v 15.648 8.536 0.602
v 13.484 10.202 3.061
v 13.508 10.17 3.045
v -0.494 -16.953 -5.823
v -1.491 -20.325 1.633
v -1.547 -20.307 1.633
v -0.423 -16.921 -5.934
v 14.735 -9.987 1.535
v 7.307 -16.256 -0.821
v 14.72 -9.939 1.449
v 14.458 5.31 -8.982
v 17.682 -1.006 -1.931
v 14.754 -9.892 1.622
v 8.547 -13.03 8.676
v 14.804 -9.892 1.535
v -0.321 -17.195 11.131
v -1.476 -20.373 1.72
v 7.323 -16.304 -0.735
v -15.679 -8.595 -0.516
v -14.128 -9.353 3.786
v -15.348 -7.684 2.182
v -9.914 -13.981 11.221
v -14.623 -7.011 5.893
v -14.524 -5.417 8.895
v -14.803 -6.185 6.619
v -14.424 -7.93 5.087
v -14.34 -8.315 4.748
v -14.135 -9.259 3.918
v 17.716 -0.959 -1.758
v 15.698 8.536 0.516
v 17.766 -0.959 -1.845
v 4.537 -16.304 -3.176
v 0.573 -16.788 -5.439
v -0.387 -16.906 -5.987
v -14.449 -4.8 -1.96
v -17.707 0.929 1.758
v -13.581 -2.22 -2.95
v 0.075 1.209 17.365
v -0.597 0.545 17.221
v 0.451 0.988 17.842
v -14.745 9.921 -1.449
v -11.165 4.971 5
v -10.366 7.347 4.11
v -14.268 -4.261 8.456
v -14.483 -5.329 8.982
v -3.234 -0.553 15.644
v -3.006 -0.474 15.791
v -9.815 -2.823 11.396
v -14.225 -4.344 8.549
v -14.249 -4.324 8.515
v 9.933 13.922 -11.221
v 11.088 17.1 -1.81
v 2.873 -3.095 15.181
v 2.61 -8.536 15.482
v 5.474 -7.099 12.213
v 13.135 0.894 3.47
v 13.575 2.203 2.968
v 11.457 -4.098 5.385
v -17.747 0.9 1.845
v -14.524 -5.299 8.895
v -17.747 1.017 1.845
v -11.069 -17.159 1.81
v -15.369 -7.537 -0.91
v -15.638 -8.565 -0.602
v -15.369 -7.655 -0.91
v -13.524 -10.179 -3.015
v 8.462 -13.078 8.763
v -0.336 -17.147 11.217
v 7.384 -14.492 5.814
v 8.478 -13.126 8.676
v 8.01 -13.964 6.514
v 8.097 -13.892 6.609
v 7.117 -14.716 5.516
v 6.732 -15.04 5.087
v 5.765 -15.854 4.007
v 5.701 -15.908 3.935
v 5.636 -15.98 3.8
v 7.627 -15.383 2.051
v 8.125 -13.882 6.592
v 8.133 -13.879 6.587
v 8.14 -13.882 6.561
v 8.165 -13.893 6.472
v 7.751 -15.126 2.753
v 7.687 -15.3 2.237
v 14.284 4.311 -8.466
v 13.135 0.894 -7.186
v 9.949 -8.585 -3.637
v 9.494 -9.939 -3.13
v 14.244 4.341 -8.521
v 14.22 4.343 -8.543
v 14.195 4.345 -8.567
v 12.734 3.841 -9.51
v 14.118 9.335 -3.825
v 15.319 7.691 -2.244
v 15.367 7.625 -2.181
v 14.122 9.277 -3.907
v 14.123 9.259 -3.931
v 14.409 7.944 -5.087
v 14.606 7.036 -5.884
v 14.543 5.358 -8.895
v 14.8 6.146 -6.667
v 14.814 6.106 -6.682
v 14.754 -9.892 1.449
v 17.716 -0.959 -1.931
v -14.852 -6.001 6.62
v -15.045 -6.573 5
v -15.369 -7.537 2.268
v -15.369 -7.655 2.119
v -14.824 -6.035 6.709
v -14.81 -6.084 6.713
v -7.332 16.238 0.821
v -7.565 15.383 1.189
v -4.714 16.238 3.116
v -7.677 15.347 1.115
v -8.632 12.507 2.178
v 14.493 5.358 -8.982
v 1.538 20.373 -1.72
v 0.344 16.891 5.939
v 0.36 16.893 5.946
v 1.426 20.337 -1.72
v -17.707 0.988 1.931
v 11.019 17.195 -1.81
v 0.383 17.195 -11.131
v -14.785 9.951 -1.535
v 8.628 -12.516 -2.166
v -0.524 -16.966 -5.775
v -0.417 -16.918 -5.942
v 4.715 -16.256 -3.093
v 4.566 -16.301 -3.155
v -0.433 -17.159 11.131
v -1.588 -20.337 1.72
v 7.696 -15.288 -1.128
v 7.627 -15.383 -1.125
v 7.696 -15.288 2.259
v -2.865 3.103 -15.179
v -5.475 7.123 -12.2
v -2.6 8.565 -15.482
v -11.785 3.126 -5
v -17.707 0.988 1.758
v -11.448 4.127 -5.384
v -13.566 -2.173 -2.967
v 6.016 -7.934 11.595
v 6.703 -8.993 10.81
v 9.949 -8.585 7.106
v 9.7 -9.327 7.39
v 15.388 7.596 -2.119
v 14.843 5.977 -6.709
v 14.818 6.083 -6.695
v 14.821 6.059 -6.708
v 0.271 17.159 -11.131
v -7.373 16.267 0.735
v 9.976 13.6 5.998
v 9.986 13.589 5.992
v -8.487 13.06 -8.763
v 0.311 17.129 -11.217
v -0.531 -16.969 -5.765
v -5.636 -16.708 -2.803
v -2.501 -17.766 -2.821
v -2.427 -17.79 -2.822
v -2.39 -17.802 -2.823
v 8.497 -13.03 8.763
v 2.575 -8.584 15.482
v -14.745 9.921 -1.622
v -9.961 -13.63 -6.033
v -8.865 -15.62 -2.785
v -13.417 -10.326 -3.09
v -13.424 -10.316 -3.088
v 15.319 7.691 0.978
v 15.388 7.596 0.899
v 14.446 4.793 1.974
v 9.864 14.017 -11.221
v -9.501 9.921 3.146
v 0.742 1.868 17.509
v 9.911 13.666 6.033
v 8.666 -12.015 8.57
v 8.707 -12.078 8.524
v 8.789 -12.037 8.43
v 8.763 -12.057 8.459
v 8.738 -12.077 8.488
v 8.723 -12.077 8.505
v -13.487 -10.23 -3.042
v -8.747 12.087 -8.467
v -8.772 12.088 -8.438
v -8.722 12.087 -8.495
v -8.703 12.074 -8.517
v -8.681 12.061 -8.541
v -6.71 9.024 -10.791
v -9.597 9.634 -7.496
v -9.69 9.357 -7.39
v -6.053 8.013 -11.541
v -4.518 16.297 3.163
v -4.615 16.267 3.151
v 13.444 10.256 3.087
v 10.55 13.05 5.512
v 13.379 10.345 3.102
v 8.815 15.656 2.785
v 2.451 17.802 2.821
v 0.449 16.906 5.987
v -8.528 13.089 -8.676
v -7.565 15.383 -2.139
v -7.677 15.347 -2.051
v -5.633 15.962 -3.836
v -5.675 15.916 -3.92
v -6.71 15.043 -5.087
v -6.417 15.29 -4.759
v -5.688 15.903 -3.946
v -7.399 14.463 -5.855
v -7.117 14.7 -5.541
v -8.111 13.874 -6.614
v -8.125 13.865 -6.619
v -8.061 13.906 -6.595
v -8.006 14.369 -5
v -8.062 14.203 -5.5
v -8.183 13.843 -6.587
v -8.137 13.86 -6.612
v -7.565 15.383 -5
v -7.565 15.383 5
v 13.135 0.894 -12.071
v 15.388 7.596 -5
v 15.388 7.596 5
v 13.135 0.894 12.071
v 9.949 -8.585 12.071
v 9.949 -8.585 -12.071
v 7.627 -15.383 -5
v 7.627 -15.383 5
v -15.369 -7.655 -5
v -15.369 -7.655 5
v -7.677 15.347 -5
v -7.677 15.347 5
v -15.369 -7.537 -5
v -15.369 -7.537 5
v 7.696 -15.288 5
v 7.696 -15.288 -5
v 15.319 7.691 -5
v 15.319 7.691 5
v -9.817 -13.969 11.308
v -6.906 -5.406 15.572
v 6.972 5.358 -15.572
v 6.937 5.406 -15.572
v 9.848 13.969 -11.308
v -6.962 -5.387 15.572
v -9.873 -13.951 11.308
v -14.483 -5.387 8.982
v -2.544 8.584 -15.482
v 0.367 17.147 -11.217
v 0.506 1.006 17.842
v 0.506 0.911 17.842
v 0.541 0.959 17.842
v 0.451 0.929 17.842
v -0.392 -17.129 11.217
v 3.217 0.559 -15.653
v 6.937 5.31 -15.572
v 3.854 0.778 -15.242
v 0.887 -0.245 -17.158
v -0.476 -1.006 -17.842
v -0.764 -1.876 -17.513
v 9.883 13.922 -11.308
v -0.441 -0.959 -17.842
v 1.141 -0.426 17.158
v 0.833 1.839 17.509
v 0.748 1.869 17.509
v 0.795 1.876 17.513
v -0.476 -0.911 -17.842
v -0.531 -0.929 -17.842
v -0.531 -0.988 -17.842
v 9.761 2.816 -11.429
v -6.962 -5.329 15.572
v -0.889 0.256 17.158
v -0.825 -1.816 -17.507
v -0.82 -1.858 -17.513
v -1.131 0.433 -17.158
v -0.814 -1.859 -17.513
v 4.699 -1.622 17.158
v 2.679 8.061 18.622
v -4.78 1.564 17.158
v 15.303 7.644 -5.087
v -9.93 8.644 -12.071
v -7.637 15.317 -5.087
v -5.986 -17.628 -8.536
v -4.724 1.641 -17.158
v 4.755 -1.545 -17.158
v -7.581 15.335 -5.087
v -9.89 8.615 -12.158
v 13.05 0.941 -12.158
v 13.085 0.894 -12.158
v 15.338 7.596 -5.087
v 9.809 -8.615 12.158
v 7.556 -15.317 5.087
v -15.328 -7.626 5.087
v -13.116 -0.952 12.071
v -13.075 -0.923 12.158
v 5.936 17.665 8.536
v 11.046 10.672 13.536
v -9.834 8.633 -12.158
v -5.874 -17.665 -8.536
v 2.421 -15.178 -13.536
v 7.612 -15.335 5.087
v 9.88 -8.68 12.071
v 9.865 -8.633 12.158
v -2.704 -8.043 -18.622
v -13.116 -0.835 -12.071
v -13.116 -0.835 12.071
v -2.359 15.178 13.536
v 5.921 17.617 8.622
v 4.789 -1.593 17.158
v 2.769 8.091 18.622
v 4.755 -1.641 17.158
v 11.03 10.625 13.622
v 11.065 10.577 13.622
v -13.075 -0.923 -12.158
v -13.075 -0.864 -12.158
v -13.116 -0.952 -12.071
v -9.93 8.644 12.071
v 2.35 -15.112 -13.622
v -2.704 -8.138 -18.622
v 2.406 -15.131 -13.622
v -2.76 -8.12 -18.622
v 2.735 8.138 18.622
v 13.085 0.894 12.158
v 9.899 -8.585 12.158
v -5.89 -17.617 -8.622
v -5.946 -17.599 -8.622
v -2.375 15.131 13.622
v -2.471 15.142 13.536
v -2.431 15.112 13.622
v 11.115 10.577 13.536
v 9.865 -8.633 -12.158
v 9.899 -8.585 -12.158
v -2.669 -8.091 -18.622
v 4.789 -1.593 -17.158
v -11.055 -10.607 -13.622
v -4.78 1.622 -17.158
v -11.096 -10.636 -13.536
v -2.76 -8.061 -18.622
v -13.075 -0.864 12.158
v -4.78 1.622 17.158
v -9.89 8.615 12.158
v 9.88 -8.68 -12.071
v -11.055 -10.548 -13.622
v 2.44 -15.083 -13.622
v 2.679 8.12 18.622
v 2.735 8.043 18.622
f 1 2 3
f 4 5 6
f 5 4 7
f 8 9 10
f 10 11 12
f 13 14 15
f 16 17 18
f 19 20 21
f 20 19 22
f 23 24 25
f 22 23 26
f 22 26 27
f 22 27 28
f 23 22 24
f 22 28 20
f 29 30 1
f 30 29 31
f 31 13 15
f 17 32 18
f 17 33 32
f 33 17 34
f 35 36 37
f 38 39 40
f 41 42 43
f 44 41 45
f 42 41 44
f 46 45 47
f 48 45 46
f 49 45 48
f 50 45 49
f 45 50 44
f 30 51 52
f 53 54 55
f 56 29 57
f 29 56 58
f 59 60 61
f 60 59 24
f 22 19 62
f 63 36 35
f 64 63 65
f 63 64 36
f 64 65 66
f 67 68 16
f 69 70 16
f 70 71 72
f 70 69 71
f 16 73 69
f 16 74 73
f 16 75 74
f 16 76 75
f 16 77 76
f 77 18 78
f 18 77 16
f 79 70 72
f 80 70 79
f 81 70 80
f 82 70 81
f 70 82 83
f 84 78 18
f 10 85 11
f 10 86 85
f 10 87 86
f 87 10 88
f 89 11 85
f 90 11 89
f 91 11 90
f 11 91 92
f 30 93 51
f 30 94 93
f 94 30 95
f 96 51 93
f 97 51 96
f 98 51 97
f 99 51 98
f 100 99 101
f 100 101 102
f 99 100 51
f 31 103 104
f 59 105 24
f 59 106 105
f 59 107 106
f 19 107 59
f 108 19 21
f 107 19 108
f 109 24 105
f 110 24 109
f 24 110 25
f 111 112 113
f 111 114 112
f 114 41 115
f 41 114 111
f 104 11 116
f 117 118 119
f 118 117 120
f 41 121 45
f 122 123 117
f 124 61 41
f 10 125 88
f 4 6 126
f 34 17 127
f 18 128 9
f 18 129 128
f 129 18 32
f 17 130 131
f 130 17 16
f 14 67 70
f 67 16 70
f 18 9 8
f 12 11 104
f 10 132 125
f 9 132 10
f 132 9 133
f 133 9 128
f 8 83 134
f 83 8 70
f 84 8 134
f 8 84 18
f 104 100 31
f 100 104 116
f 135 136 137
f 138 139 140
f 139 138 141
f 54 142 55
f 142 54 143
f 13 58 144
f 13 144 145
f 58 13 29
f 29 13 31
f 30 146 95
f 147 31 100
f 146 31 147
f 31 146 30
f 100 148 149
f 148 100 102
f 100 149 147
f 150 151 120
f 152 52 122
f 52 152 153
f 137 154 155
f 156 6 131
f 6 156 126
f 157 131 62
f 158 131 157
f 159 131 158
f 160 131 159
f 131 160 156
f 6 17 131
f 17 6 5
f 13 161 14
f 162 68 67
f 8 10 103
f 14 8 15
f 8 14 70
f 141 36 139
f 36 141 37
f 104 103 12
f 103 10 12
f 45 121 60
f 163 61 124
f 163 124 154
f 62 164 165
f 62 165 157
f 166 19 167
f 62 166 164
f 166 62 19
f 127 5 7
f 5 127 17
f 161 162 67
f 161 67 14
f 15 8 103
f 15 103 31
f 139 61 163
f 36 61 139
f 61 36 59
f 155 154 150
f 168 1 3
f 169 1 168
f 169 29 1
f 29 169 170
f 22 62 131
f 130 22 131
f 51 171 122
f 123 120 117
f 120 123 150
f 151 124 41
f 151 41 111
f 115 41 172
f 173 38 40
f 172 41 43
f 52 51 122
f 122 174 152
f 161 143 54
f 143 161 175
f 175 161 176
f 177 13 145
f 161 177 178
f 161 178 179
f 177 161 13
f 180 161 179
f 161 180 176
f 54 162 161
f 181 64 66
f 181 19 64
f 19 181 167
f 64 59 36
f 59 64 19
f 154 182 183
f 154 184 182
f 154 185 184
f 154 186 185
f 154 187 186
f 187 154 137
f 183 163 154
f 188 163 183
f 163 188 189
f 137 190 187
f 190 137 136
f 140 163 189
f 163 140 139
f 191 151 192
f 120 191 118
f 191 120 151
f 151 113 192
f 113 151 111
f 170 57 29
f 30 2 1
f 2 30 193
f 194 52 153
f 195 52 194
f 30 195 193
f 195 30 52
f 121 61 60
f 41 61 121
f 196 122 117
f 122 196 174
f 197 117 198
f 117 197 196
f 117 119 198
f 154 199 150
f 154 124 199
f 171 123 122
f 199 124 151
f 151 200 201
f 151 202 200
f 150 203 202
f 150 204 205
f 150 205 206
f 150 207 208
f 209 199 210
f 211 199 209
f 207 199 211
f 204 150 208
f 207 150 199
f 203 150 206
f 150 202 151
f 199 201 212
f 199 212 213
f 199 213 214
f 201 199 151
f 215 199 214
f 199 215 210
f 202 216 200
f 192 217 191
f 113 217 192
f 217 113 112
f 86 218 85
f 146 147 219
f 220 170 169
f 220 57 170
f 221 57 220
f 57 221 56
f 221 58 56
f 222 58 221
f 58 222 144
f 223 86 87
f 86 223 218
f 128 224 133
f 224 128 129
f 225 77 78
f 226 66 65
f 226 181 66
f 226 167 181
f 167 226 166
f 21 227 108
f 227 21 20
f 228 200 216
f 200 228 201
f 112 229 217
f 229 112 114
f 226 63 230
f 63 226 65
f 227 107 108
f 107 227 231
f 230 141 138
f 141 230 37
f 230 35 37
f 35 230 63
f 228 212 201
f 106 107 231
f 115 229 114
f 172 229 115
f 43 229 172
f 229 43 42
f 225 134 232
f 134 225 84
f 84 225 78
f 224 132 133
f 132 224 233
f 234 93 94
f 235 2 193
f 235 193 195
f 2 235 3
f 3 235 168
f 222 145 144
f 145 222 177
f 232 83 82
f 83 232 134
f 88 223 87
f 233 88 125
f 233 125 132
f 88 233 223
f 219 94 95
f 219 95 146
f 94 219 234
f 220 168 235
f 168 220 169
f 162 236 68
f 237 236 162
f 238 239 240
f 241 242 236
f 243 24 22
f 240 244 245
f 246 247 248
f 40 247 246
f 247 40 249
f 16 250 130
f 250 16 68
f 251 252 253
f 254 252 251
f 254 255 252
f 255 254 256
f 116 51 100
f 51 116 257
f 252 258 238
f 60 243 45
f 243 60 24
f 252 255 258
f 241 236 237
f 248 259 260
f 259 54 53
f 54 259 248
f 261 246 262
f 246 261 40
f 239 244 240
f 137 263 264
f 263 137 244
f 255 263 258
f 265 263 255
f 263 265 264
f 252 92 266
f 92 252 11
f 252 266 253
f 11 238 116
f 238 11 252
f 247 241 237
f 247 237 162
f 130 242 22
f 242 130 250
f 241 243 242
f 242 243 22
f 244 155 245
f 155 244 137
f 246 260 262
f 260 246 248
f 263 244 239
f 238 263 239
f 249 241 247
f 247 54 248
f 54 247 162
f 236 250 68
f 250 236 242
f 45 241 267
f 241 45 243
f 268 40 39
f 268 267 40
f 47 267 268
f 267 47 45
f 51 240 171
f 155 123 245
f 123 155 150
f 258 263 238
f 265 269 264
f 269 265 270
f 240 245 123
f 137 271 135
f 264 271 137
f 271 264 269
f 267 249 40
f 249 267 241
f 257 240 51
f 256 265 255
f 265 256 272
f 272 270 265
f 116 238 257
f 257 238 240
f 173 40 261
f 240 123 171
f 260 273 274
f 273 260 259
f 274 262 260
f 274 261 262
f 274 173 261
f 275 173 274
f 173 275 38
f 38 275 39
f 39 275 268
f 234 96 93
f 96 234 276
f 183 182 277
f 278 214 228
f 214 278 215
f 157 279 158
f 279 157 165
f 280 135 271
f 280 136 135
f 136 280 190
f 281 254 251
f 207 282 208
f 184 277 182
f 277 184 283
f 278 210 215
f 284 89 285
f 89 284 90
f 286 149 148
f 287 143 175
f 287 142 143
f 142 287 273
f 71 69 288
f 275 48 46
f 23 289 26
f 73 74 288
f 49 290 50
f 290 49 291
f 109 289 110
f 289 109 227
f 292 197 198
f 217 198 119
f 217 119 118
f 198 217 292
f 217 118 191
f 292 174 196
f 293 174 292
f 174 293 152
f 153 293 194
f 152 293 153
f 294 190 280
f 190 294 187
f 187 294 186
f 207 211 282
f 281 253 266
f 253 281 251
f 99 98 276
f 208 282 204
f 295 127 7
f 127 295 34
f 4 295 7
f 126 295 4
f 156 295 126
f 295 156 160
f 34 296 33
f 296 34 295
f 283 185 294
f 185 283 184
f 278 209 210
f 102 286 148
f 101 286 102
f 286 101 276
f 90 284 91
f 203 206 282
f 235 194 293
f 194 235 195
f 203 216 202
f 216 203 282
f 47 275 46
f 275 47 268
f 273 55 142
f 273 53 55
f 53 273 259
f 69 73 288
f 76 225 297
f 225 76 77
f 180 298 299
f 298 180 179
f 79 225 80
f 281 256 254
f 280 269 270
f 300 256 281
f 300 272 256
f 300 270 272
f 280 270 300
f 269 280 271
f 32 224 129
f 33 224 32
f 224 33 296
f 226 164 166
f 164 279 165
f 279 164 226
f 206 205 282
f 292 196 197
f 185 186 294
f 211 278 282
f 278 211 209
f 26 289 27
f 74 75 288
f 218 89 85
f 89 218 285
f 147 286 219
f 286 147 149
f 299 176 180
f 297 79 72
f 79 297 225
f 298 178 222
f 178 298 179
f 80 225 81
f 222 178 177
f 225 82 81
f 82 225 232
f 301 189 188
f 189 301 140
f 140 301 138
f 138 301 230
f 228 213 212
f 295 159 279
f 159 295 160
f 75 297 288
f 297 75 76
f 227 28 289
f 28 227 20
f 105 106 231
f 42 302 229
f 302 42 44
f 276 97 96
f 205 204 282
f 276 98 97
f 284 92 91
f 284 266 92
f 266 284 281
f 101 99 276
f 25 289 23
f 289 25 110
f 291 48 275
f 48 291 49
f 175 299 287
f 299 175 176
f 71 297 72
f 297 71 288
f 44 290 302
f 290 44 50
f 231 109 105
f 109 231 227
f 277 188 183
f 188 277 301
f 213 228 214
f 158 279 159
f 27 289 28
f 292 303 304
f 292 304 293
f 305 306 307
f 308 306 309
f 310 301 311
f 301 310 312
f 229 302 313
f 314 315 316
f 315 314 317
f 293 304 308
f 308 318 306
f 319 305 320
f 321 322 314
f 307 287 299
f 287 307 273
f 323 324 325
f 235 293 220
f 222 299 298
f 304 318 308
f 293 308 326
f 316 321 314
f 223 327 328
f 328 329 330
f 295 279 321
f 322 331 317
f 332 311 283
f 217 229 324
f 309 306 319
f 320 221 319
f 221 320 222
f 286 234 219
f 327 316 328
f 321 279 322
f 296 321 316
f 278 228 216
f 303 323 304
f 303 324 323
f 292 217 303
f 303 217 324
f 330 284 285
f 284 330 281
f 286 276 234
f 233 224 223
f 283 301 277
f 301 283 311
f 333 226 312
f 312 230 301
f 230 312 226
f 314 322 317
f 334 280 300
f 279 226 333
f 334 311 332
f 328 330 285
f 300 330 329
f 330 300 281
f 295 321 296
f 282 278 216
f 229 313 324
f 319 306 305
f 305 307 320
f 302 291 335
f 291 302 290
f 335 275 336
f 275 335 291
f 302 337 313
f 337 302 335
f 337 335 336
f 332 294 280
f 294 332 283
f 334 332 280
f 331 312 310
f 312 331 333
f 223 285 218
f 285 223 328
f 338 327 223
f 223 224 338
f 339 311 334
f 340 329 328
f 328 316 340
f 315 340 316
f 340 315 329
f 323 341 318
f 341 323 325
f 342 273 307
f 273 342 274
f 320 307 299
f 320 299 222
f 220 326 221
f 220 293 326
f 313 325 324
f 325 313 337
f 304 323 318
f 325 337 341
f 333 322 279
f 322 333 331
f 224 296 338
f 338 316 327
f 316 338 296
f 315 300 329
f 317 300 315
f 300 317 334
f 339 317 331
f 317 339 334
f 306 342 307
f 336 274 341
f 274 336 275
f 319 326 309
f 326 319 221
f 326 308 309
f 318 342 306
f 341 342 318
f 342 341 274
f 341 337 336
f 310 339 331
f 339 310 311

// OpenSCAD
// Auto-generated OpenSCAD file

    inner_points = 10*[[-0.9849058201924669, 0.8585262410125142, 1.2071067811863656], [-1.528785757453395, -0.759623373893002, -0.49999999999996925], [-0.7596233738762859, 1.5287857574549684, 0.4999999999997299], [-1.3035033111372138, -0.08936385745054792, -1.207106781186605], [1.3035033111553536, 0.08936385743535108, 1.207106781186605], [0.7596233738944258, -1.528785757470165, -0.4999999999997299], [1.5287857574715347, 0.7596233738778053, 0.49999999999996925], [0.9849058202106068, -0.8585262410277109, -1.2071067811863656], [-1.3035033111373446, -0.08936385745018655, 1.2071067811864902], [-1.5287857574534491, -0.7596233738928524, 0.5000000000000306], [-0.7596233738762316, 1.5287857574548187, -0.50000000000027], [-0.9849058201923361, 0.8585262410121528, -1.2071067811867295], [0.984905820210476, -0.8585262410273495, 1.2071067811867295], [0.7596233738943715, -1.5287857574700154, 0.50000000000027], [1.5287857574715888, 0.7596233738776557, -0.5000000000000306], [1.3035033111554843, 0.0893638574349897, -1.2071067811864902], [-0.4739450492223731, 0.159298745465096, 1.707106781186498], [-1.0178249864833009, -1.4588508694404203, 1.6314155227994063e-13], [0.06993488803873991, 1.7774483603701012, -2.6229591075641936e-13], [-0.4739450492221878, 0.15929874546458486, -1.707106781186597], [0.4739450492403277, -0.1592987454797817, 1.707106781186597], [-0.06993488802060001, -1.777448360385298, 2.6229591075641936e-13], [1.0178249865014406, 1.4588508694252236, -1.6314155227994063e-13], [0.47394504924051306, -0.15929874548029285, -1.707106781186498], [-0.23902080233061446, 1.5083023029927278, 1.353553390593035], [-1.1014982305363656, -1.0577374103756392, -1.3535533905931754], [1.1014982305545054, 1.0577374103604424, 1.3535533905931754], [0.2390208023487544, -1.5083023030079246, -1.353553390593035], [0.27193996863947956, 0.8090748074453095, 1.8535533905931674], [-0.5905374595662716, -1.7569649059230572, -0.8535533905930429], [0.5905374595844115, 1.7569649059078605, 0.8535533905930429], [-0.2719399686213396, -0.8090748074605062, -1.8535533905931674]];

    outer_points = 10*[[-0.8446900511180744, 1.3030414766726957, -0.867637706641361], [-1.5597798480580507, -0.8536041736719377, -0.05157812186332089], [-0.25595636104042685, 0.8536041736719377, -1.5394998597940455], [-0.9710461579804031, -1.3030414766726957, -0.7234402750160054], [0.9710461579804031, 1.3030414766726957, 0.7234402750160054], [0.25595636104042685, -0.8536041736719377, 1.5394998597940455], [1.5597798480580507, 0.8536041736719377, 0.05157812186332089], [0.8446900511180744, -1.3030414766726957, 0.867637706641361], [-1.470432588051366, 0.9891747549732535, -0.15354110359529327], [-1.7666324802585267, 0.0958628773675625, 0.18448184412432744], [-0.04910372883995073, -0.0958628773675625, -1.7755598257816938], [-0.34530362104711143, -0.9891747549732535, -1.437536878062073], [0.34530362104711143, 0.9891747549732535, 1.437536878062073], [0.04910372883995073, 0.0958628773675625, 1.7755598257816938], [1.7666324802585267, -0.0958628773675625, -0.18448184412432744], [1.470432588051366, -0.9891747549732535, 0.15354110359529327], [-0.7291708128859692, 1.6208416413427247, 0.07345652930633434], [-1.4442606098259454, -0.5358040090019087, 0.8895161140843744], [0.692158046325446, 0.5358040090019087, -1.5485621928800661], [-0.022931750614530233, -1.6208416413427247, -0.732502608102026], [0.022931750614530233, 1.6208416413427247, 0.732502608102026], [-0.692158046325446, -0.5358040090019087, 1.5485621928800661], [1.4442606098259454, 0.5358040090019087, -0.8895161140843744], [0.7291708128859692, -1.6208416413427247, -0.07345652930633434], [0.03517302803740674, 1.7099897115417881, -1.113064062349067], [-1.098806673635385, -1.7099897115417881, 0.18103215948739226], [1.098806673635385, 1.7099897115417881, -0.18103215948739226], [-0.03517302803740674, -1.7099897115417881, 1.113064062349067], [0.15069226626951202, 2.027789876211817, -0.17196982640137165], [-0.9832874354032798, -1.392189546871759, 1.122126395435088], [0.9832874354032798, 1.392189546871759, -1.122126395435088], [-0.15069226626951202, -2.027789876211817, 0.17196982640137165]];

    // Convex hull for inner set (I)
    module inner_hull() {
        hull() {
            for (p = inner_points) {
                translate(p) sphere(r=0.1);
            }
        }
    }

    // Convex hull for outer set (O) minus inner hull (O \ I)
    module outer_minus_inner() {
        difference() {
            hull() {
                for (p = outer_points) {
                    translate(p) sphere(r=0.1);
                }
            }
            inner_hull(); // Subtract inner hull
        }
    }

    // Convex hull for outer set (O) minus all translated inner hulls
    module outer_minus_AllTranslationInner() {
        difference() {
            hull() {
                for (p = outer_points) {
                    translate(p) sphere(r=0.1);
                }
            }
            hull() {
                translate([0,0,50]) inner_hull();
                translate([0,0,-50]) inner_hull();
            }; // Subtract translated inner hulls
        }
    }

    // Difference between outer_minus_inner and outer_minus_AllTranslationInner
    module outer_minus_inner_diff() {
        difference() {
            // Outer minus inner
            difference() {
                hull() {
                    for (p = outer_points) {
                        translate(p) sphere(r=0.1);
                    }
                }
                inner_hull();
            }

            // Subtract Outer minus AllTranslationInner
            difference() {
                hull() {
                    for (p = outer_points) {
                        translate(p) sphere(r=0.1);
                    }
                }
                hull() {
                    translate([0,0,50]) inner_hull();
                    translate([0,0,-50]) inner_hull();
                };
            }
        }
    }

    // Rendering all with colors applied
    color([1, 0, 0, 0.5]) inner_hull(); // Transparent red
    color([0, 1, 0, 1]) outer_minus_AllTranslationInner(); // Opaque green
    color([1, 1, 0, 1]) outer_minus_inner_diff(); // Opaque yellow
    
